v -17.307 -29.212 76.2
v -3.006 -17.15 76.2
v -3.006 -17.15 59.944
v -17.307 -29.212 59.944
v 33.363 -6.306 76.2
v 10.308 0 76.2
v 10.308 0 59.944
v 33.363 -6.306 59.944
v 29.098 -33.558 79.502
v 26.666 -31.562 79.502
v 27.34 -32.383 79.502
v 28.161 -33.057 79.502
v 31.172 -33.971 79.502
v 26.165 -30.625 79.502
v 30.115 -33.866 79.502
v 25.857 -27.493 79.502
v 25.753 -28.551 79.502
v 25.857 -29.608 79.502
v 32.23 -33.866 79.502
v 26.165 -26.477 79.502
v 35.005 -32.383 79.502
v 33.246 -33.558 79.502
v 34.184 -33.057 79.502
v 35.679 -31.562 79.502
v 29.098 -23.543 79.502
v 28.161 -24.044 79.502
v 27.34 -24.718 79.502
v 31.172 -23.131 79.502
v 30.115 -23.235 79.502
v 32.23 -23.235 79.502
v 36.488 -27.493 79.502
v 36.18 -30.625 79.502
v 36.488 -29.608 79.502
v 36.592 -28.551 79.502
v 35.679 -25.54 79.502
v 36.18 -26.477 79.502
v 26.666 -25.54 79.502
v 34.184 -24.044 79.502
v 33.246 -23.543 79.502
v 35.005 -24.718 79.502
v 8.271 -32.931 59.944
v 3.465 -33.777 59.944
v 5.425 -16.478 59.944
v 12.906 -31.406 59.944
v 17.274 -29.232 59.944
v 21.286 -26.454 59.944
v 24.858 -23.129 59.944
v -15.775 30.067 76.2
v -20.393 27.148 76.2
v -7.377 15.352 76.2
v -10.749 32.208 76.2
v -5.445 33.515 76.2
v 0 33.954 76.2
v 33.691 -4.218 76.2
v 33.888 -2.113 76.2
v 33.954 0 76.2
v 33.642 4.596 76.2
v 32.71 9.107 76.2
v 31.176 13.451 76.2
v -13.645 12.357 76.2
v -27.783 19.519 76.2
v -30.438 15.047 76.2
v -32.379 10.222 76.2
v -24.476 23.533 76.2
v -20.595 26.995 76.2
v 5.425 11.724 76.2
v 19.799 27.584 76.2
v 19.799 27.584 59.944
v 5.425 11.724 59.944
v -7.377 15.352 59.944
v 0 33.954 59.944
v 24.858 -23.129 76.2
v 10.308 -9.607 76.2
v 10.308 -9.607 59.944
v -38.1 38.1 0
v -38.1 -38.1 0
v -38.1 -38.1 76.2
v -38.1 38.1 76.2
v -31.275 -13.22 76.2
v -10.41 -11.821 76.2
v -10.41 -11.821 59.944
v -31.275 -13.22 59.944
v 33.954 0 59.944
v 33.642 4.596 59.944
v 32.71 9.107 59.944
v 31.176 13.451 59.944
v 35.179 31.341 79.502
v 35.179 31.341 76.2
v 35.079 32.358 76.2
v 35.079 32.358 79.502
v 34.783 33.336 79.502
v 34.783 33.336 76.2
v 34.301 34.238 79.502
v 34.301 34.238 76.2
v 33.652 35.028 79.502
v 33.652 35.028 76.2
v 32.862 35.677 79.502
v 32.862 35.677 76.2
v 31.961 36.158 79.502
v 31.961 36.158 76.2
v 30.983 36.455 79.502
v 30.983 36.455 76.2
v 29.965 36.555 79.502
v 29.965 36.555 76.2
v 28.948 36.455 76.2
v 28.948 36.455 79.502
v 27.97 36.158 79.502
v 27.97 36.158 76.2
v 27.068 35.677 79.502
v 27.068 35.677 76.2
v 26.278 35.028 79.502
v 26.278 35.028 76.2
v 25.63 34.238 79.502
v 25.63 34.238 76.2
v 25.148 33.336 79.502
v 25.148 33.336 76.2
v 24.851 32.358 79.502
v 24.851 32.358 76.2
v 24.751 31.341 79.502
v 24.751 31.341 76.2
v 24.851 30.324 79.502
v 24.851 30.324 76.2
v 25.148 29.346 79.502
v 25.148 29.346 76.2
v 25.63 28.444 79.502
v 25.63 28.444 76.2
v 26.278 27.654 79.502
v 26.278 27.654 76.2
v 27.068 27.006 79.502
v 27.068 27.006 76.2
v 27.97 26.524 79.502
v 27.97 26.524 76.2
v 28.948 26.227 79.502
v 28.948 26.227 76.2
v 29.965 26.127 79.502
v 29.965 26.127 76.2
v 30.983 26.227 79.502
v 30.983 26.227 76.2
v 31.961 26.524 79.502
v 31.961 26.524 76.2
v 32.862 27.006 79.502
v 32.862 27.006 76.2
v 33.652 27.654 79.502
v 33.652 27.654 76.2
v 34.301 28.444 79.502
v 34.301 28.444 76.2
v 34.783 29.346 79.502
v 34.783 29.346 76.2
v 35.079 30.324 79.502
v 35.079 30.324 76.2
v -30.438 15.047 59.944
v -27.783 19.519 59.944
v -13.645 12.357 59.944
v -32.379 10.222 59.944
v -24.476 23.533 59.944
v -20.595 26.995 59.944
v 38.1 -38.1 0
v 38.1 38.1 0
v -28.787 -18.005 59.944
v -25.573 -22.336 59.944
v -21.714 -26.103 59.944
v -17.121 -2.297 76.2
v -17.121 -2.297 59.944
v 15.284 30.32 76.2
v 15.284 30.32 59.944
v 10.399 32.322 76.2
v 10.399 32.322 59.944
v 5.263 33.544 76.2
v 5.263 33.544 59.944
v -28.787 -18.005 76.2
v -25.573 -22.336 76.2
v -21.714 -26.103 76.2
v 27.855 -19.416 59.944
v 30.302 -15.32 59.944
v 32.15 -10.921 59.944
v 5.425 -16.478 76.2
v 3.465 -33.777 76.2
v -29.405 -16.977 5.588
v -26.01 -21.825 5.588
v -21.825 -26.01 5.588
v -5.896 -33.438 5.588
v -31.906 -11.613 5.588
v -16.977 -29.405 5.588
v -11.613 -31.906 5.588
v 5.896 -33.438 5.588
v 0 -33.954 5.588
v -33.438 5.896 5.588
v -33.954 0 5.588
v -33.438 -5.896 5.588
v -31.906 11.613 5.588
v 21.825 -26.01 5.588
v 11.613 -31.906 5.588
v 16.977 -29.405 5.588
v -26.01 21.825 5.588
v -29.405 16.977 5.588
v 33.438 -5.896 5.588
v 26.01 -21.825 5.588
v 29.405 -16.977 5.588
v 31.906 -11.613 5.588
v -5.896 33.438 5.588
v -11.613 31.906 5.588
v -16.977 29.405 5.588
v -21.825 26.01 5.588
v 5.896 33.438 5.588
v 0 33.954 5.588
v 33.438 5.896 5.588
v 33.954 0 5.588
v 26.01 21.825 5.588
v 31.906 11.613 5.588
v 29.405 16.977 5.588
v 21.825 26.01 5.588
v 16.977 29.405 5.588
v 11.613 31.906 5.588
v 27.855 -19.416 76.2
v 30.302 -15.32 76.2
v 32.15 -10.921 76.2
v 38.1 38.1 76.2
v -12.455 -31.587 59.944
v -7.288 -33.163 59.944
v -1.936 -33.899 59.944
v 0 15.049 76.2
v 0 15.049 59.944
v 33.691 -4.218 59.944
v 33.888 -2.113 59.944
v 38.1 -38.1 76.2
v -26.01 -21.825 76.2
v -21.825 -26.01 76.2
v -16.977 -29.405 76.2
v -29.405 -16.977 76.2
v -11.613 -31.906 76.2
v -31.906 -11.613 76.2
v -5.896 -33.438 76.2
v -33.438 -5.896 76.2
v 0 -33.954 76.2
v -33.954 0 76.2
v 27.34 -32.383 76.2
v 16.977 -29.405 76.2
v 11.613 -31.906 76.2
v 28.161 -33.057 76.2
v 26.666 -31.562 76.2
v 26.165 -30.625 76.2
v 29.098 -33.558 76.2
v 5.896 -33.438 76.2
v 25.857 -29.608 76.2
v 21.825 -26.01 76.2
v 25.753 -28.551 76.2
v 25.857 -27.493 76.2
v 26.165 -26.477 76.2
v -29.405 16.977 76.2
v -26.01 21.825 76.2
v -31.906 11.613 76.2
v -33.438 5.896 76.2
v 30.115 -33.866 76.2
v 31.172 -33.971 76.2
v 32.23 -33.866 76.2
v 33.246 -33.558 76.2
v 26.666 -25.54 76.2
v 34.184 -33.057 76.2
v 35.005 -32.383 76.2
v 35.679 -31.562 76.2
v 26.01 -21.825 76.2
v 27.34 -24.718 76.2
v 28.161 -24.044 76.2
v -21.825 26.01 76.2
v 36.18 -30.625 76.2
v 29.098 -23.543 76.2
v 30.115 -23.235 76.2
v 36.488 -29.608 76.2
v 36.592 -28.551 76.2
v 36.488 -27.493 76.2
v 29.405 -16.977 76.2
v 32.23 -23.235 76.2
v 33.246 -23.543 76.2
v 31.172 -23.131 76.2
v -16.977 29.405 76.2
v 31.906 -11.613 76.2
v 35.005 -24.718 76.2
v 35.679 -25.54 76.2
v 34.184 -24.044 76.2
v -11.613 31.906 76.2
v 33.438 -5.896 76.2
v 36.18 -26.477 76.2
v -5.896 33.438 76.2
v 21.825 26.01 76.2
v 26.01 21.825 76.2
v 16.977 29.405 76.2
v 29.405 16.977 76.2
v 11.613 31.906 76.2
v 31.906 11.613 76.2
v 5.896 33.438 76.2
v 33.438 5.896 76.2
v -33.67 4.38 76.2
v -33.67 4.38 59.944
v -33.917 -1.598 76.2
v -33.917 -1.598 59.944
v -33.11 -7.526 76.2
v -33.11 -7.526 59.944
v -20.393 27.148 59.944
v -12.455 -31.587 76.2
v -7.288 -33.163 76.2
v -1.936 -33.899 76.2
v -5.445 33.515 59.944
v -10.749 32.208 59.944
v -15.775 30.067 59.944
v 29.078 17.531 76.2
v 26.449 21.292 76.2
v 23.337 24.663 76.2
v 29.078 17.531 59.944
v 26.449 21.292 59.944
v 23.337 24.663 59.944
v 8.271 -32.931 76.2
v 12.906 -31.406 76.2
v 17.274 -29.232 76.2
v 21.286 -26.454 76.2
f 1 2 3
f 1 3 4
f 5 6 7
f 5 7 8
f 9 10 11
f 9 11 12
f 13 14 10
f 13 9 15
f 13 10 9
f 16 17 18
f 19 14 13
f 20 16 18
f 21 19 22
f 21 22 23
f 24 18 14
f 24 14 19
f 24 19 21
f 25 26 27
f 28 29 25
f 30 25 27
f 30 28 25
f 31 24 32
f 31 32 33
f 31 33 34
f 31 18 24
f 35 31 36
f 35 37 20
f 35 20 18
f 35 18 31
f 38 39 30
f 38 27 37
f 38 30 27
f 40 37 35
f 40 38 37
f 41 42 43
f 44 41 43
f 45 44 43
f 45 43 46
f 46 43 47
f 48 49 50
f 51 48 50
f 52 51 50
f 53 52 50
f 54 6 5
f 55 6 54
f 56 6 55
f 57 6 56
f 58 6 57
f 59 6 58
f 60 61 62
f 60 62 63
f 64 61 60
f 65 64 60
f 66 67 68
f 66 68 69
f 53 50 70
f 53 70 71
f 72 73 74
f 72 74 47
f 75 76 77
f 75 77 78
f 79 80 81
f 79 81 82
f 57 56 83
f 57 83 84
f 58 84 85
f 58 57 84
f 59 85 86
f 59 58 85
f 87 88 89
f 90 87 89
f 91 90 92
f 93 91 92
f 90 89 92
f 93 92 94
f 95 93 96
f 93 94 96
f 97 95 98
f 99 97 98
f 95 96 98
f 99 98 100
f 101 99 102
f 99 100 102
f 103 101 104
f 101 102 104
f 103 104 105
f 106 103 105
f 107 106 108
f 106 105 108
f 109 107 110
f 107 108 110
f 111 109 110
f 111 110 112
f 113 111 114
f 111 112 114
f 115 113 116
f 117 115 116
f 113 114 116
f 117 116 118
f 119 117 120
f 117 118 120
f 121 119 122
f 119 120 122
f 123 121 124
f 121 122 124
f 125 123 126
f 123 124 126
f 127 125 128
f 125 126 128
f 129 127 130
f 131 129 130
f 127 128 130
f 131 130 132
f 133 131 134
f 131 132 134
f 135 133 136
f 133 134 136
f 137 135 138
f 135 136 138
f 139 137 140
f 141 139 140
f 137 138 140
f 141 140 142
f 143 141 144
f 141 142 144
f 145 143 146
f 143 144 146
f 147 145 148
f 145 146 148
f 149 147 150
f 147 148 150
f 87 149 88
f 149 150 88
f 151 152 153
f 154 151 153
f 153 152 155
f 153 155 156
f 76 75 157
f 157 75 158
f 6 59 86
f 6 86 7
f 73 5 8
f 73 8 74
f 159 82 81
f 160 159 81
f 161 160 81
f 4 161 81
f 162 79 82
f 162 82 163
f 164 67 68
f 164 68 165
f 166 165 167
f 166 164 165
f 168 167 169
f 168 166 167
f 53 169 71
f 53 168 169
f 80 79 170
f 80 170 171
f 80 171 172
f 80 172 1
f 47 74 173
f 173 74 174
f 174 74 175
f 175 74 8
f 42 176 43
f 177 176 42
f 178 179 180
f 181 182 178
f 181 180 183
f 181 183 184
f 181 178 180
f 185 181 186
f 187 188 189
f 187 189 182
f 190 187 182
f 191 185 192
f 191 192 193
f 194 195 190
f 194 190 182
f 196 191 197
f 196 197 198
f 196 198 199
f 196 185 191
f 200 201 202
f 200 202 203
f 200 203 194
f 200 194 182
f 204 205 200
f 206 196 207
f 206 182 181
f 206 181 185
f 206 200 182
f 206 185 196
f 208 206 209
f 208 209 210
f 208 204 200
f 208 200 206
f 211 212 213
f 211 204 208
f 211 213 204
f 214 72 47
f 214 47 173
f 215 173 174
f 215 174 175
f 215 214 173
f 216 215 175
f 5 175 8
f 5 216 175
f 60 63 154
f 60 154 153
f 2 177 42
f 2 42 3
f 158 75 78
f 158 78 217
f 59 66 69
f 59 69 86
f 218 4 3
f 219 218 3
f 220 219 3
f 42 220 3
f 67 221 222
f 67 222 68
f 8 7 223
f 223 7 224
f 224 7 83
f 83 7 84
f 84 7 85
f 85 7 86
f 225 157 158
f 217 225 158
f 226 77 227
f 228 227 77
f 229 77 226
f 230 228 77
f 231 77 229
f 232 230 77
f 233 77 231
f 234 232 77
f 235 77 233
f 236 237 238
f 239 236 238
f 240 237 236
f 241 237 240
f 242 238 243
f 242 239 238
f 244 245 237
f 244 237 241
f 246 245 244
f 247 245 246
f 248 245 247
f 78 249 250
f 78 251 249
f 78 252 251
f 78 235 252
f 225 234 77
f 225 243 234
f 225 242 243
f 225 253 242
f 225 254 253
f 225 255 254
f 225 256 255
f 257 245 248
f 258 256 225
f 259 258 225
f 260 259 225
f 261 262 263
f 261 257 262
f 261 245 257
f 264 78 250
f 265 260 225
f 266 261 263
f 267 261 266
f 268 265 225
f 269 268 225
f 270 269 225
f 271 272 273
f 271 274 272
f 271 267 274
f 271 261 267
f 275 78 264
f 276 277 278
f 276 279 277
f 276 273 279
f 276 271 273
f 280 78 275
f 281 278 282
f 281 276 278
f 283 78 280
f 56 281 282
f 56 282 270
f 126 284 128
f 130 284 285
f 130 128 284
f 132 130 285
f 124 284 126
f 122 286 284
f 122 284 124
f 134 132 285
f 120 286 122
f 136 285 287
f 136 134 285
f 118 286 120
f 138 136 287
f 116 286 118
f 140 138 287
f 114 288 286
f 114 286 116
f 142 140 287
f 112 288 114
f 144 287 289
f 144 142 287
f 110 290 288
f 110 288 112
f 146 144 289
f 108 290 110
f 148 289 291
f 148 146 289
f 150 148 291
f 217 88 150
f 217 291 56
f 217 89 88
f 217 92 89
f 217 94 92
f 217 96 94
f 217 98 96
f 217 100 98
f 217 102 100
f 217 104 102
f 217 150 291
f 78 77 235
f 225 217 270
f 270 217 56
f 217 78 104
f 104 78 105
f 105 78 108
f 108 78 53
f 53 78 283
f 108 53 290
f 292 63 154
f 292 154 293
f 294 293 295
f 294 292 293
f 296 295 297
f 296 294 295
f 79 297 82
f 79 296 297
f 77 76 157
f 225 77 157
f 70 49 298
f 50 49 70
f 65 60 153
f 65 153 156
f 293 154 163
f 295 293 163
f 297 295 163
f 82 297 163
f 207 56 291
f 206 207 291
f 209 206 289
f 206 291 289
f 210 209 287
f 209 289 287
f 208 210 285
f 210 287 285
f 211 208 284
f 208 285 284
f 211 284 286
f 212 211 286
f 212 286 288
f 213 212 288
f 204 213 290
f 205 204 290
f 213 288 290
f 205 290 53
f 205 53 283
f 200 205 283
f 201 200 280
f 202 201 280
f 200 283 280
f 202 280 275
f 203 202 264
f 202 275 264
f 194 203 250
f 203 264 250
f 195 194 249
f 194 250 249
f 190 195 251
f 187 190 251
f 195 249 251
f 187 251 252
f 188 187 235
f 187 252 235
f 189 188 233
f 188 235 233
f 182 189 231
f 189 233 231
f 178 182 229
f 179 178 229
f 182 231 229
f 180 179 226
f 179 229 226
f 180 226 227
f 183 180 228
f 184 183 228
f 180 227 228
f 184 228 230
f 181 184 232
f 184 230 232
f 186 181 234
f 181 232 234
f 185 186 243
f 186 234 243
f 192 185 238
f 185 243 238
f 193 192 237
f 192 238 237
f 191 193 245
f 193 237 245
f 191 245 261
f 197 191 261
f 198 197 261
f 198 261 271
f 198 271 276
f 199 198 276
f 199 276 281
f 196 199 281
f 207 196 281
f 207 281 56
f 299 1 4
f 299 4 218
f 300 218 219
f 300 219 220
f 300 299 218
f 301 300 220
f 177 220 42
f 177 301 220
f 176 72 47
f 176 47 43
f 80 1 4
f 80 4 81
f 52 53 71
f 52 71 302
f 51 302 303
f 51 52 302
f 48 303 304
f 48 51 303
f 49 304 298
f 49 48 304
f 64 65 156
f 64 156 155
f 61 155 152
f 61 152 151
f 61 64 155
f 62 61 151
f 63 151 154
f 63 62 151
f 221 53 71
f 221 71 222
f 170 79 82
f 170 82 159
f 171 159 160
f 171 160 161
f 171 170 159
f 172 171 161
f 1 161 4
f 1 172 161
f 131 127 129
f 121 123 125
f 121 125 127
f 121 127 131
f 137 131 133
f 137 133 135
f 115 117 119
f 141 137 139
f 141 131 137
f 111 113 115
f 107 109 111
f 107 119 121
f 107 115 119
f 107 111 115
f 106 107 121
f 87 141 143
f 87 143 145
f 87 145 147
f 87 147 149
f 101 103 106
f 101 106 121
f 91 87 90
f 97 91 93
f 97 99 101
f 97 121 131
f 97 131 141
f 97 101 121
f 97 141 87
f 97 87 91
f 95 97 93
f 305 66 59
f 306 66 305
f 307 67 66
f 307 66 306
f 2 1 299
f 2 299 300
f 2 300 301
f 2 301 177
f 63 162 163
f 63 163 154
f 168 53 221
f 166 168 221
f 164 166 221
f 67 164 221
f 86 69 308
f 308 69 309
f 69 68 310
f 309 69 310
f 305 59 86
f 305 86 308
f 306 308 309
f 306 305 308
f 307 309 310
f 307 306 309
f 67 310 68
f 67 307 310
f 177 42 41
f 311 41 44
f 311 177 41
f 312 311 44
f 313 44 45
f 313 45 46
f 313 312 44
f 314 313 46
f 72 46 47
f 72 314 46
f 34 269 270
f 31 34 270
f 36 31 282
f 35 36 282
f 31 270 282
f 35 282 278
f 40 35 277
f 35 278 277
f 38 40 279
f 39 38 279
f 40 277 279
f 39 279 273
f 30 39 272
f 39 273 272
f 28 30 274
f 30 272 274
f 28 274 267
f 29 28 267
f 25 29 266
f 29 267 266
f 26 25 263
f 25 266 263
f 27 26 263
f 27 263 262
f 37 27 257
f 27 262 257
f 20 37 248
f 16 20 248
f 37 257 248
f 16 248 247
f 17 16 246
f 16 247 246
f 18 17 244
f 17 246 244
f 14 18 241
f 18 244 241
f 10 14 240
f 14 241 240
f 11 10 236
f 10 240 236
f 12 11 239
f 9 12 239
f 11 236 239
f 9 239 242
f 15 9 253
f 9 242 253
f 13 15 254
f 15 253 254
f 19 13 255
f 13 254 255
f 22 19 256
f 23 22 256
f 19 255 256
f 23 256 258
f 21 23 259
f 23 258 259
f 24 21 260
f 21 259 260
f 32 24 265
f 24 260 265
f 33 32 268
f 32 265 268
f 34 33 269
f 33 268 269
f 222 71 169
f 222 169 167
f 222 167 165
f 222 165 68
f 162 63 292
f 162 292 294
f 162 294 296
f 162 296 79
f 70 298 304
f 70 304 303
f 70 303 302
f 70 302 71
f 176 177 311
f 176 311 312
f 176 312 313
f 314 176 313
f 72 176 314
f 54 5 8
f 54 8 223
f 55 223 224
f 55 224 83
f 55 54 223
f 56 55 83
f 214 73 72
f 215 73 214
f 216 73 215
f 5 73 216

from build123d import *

# Parameters (mm, degrees)
F0_W     = 76.2
F0_H     = 76.2
F1_DEPTH = 76.2
F2_R     = 33.9541116817
F3_DEPTH = 70.612
F5_DEPTH = 16.256
F6_R     = 5.4198539704
F6_R_2   = 5.2141631228
F7_DEPTH = 3.302


with BuildPart() as f1:
    # F0 (on Top) → F1 (new body)
    with BuildSketch(Plane.XY):
        Rectangle(F0_W, F0_H)
    extrude(amount=F1_DEPTH)

    # F2 (on face) → F3 (cut)
    with BuildSketch(Plane.XY.offset(76.2)):
        Circle(F2_R)
    extrude(amount=-F3_DEPTH, mode=Mode.SUBTRACT)

    # F6 (on face) → F7 (join)
    with BuildSketch(Plane.XY.offset(76.2)):
        with Locations((31.1724040657, -28.5507440567)):
            Circle(F6_R)
        with Locations((29.9653299153, 31.3411131501)):
            Circle(F6_R_2)
    extrude(amount=F7_DEPTH)


with BuildPart() as f5:
    # F4 (on face) → F5 (new body)
    with BuildSketch(Plane.XY.offset(76.2)):
        with BuildLine():
            ThreePointArc((31.1760366044, 13.4512617153), (26.4489796747, 21.2916221612), (19.7990401795, 27.5840480724))
            Line((19.7990401795, 27.5840480724), (5.4253302515, 11.7242569104))
            Line((5.4253302515, 11.7242569104), (31.1760366044, 13.4512617153))
        make_face()
    extrude(amount=-F5_DEPTH)


with BuildPart() as f5b:
    # F4 (on face) → F5, piece 2 (new body)
    with BuildSketch(Plane.XY.offset(76.2)):
        with BuildLine():
            Line((0, 15.0486538187), (19.7990401795, 27.5840480724))
            ThreePointArc((19.7990401795, 27.5840480724), (10.3992752442, 32.3223881309), (0, 33.9541116817))
            Line((0, 33.9541116817), (0, 15.0486538187))
        make_face()
    extrude(amount=-F5_DEPTH)


with BuildPart() as f5c:
    # F4 (on face) → F5, piece 3 (new body)
    with BuildSketch(Plane.XY.offset(76.2)):
        with BuildLine():
            Line((-7.3773125187, 15.3518142179), (0, 33.9541116817))
            ThreePointArc((0, 33.9541116817), (-10.7493962212, 32.2076416549), (-20.3929765412, 27.1478950912))
            Line((-20.3929765412, 27.1478950912), (-7.3773125187, 15.3518142179))
        make_face()
    extrude(amount=-F5_DEPTH)


with BuildPart() as f5d:
    # F4 (on face) → F5, piece 4 (new body)
    with BuildSketch(Plane.XY.offset(76.2)):
        with BuildLine():
            Line((-13.6453760788, 12.3567078263), (-20.5946803059, 26.9952003732))
            ThreePointArc((-20.5946803059, 26.9952003732), (-27.7827808928, 19.5191901972), (-32.3788527166, 10.2221131302))
            Line((-32.3788527166, 10.2221131302), (-13.6453760788, 12.3567078263))
        make_face()
    extrude(amount=-F5_DEPTH)


with BuildPart() as f5e:
    # F4 (on face) → F5, piece 5 (new body)
    with BuildSketch(Plane.XY.offset(76.2)):
        with BuildLine():
            Line((-17.1205271035, -2.2973336745), (-32.3788527166, 10.2221131302))
            ThreePointArc((-32.3788527166, 10.2221131302), (-33.9165091482, -1.5975316251), (-31.2746701208, -13.2203142522))
            Line((-31.2746701208, -13.2203142522), (-17.1205271035, -2.2973336745))
        make_face()
    extrude(amount=-F5_DEPTH)


with BuildPart() as f5f:
    # F4 (on face) → F5, piece 6 (new body)
    with BuildSketch(Plane.XY.offset(76.2)):
        with BuildLine():
            Line((-10.410211049, -11.8210120127), (-31.2746701208, -13.2203142522))
            ThreePointArc((-31.2746701208, -13.2203142522), (-25.5730513598, -22.3360861441), (-17.3070828689, -29.2120965126))
            Line((-17.3070828689, -29.2120965126), (-10.410211049, -11.8210120127))
        make_face()
    extrude(amount=-F5_DEPTH)


with BuildPart() as f5g:
    # F4 (on face) → F5, piece 7 (new body)
    with BuildSketch(Plane.XY.offset(76.2)):
        with BuildLine():
            ThreePointArc((-17.3070828689, -29.2120965126), (-7.2878234024, -33.1627702423), (3.4646763369, -33.7768814127))
            Line((3.4646763369, -33.7768814127), (-3.0055609532, -17.1499848366))
            Line((-3.0055609532, -17.1499848366), (-17.3070828689, -29.2120965126))
        make_face()
    extrude(amount=-F5_DEPTH)


with BuildPart() as f5h:
    # F4 (on face) → F5, piece 8 (new body)
    with BuildSketch(Plane.XY.offset(76.2)):
        with BuildLine():
            ThreePointArc((3.4646763369, -33.7768814127), (15.1290291346, -30.3972725345), (24.8580469298, -23.12918509))
            Line((24.8580469298, -23.12918509), (5.4253302515, -16.478298232))
            Line((5.4253302515, -16.478298232), (3.4646763369, -33.7768814127))
        make_face()
    extrude(amount=-F5_DEPTH)


with BuildPart() as f5i:
    # F4 (on face) → F5, piece 9 (new body)
    with BuildSketch(Plane.XY.offset(76.2)):
        with BuildLine():
            ThreePointArc((24.8580469298, -23.12918509), (30.3015390192, -15.3198705334), (33.3633170435, -6.3064075307))
            Line((33.3633170435, -6.3064075307), (10.308181867, -9.6073327586))
            Line((10.308181867, -9.6073327586), (24.8580469298, -23.12918509))
        make_face()
    extrude(amount=-F5_DEPTH)


with BuildPart() as f5j:
    # F4 (on face) → F5, piece 10 (new body)
    with BuildSketch(Plane.XY.offset(76.2)):
        with BuildLine():
            ThreePointArc((33.9541116817, 0), (33.2523407353, 6.8675713114), (31.1760366044, 13.4512617153))
            Line((31.1760366044, 13.4512617153), (10.308181867, 0))
            Line((10.308181867, 0), (33.3633170435, -6.3064075307))
            ThreePointArc((33.3633170435, -6.3064075307), (33.8060903763, -3.1670101929), (33.9541116817, 0))
        make_face()
    extrude(amount=-F5_DEPTH)


solid = Compound([f1.part, f5.part, f5b.part, f5c.part, f5d.part, f5e.part, f5f.part, f5g.part, f5h.part, f5i.part, f5j.part])
